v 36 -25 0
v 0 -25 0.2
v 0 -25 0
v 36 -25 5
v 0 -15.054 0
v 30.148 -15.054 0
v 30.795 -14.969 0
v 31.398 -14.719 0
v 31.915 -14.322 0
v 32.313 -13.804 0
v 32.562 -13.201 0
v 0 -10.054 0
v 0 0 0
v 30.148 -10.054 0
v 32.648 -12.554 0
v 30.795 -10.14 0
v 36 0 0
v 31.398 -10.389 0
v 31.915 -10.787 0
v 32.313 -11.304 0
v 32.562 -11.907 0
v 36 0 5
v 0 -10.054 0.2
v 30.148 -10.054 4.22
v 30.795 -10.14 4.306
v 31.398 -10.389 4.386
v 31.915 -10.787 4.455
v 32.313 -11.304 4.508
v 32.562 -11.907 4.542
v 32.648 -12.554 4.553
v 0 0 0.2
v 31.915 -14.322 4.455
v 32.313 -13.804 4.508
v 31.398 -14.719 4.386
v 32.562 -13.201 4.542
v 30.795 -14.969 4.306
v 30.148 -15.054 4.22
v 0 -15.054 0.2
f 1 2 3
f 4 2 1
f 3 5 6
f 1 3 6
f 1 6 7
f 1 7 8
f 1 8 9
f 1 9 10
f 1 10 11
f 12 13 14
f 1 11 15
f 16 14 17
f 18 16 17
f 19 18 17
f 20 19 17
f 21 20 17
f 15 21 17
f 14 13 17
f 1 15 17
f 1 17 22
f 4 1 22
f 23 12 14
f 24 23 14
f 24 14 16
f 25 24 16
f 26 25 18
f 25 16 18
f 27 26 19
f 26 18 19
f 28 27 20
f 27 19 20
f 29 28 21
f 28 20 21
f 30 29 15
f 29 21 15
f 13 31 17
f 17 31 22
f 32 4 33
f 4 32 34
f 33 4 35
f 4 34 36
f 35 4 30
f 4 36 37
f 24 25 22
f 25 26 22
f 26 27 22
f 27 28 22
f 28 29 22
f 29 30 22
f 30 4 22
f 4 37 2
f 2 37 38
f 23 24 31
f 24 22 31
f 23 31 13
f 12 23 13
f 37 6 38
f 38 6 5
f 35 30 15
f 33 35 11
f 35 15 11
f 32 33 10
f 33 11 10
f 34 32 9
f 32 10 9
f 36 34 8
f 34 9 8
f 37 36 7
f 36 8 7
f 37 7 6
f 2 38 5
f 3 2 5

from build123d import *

# Parameters (mm, degrees)
F1_DEPTH = 25
F3_D     = 4
F4_DEPTH = 25


with BuildPart() as f1:
    # F0 (on Front) → F1 (new body)
    with BuildSketch(Plane.XZ):
        Polygon((0, 0.2), (0, 0), (36, 0), (36, 5), align=None)
    extrude(amount=F1_DEPTH)

    # F3 (through all)
    with Locations(Plane(origin=(0, 0, 0), x_dir=(1, 0, 0), z_dir=(0, 0, -1))):
        with Locations((30.147626, 12.554323)):
            Hole(F3_D / 2)

    # F2 (on face) → F4 (cut)
    with BuildSketch(Plane(origin=(0, 0, 0), x_dir=(1, 0, 0), z_dir=(0, 0, -1))):
        with BuildLine():
            ThreePointArc((30.147626, 10.054323), (27.647626, 12.554323), (30.147626, 15.054323))
            Line((30.147626, 15.054323), (0, 15.054323))
            Line((0, 15.054323), (0, 10.054323))
            Line((0, 10.054323), (30.147626, 10.054323))
        make_face()
        with BuildLine():
            ThreePointArc((30.147626, 10.054323), (31.915393, 10.786556), (32.647626, 12.554323))
            ThreePointArc((32.647626, 12.554323), (31.915393, 14.32209), (30.147626, 15.054323))
            ThreePointArc((30.147626, 15.054323), (27.647626, 12.554323), (30.147626, 10.054323))
        make_face()
    extrude(amount=-F4_DEPTH, mode=Mode.SUBTRACT)


solid = f1.part
